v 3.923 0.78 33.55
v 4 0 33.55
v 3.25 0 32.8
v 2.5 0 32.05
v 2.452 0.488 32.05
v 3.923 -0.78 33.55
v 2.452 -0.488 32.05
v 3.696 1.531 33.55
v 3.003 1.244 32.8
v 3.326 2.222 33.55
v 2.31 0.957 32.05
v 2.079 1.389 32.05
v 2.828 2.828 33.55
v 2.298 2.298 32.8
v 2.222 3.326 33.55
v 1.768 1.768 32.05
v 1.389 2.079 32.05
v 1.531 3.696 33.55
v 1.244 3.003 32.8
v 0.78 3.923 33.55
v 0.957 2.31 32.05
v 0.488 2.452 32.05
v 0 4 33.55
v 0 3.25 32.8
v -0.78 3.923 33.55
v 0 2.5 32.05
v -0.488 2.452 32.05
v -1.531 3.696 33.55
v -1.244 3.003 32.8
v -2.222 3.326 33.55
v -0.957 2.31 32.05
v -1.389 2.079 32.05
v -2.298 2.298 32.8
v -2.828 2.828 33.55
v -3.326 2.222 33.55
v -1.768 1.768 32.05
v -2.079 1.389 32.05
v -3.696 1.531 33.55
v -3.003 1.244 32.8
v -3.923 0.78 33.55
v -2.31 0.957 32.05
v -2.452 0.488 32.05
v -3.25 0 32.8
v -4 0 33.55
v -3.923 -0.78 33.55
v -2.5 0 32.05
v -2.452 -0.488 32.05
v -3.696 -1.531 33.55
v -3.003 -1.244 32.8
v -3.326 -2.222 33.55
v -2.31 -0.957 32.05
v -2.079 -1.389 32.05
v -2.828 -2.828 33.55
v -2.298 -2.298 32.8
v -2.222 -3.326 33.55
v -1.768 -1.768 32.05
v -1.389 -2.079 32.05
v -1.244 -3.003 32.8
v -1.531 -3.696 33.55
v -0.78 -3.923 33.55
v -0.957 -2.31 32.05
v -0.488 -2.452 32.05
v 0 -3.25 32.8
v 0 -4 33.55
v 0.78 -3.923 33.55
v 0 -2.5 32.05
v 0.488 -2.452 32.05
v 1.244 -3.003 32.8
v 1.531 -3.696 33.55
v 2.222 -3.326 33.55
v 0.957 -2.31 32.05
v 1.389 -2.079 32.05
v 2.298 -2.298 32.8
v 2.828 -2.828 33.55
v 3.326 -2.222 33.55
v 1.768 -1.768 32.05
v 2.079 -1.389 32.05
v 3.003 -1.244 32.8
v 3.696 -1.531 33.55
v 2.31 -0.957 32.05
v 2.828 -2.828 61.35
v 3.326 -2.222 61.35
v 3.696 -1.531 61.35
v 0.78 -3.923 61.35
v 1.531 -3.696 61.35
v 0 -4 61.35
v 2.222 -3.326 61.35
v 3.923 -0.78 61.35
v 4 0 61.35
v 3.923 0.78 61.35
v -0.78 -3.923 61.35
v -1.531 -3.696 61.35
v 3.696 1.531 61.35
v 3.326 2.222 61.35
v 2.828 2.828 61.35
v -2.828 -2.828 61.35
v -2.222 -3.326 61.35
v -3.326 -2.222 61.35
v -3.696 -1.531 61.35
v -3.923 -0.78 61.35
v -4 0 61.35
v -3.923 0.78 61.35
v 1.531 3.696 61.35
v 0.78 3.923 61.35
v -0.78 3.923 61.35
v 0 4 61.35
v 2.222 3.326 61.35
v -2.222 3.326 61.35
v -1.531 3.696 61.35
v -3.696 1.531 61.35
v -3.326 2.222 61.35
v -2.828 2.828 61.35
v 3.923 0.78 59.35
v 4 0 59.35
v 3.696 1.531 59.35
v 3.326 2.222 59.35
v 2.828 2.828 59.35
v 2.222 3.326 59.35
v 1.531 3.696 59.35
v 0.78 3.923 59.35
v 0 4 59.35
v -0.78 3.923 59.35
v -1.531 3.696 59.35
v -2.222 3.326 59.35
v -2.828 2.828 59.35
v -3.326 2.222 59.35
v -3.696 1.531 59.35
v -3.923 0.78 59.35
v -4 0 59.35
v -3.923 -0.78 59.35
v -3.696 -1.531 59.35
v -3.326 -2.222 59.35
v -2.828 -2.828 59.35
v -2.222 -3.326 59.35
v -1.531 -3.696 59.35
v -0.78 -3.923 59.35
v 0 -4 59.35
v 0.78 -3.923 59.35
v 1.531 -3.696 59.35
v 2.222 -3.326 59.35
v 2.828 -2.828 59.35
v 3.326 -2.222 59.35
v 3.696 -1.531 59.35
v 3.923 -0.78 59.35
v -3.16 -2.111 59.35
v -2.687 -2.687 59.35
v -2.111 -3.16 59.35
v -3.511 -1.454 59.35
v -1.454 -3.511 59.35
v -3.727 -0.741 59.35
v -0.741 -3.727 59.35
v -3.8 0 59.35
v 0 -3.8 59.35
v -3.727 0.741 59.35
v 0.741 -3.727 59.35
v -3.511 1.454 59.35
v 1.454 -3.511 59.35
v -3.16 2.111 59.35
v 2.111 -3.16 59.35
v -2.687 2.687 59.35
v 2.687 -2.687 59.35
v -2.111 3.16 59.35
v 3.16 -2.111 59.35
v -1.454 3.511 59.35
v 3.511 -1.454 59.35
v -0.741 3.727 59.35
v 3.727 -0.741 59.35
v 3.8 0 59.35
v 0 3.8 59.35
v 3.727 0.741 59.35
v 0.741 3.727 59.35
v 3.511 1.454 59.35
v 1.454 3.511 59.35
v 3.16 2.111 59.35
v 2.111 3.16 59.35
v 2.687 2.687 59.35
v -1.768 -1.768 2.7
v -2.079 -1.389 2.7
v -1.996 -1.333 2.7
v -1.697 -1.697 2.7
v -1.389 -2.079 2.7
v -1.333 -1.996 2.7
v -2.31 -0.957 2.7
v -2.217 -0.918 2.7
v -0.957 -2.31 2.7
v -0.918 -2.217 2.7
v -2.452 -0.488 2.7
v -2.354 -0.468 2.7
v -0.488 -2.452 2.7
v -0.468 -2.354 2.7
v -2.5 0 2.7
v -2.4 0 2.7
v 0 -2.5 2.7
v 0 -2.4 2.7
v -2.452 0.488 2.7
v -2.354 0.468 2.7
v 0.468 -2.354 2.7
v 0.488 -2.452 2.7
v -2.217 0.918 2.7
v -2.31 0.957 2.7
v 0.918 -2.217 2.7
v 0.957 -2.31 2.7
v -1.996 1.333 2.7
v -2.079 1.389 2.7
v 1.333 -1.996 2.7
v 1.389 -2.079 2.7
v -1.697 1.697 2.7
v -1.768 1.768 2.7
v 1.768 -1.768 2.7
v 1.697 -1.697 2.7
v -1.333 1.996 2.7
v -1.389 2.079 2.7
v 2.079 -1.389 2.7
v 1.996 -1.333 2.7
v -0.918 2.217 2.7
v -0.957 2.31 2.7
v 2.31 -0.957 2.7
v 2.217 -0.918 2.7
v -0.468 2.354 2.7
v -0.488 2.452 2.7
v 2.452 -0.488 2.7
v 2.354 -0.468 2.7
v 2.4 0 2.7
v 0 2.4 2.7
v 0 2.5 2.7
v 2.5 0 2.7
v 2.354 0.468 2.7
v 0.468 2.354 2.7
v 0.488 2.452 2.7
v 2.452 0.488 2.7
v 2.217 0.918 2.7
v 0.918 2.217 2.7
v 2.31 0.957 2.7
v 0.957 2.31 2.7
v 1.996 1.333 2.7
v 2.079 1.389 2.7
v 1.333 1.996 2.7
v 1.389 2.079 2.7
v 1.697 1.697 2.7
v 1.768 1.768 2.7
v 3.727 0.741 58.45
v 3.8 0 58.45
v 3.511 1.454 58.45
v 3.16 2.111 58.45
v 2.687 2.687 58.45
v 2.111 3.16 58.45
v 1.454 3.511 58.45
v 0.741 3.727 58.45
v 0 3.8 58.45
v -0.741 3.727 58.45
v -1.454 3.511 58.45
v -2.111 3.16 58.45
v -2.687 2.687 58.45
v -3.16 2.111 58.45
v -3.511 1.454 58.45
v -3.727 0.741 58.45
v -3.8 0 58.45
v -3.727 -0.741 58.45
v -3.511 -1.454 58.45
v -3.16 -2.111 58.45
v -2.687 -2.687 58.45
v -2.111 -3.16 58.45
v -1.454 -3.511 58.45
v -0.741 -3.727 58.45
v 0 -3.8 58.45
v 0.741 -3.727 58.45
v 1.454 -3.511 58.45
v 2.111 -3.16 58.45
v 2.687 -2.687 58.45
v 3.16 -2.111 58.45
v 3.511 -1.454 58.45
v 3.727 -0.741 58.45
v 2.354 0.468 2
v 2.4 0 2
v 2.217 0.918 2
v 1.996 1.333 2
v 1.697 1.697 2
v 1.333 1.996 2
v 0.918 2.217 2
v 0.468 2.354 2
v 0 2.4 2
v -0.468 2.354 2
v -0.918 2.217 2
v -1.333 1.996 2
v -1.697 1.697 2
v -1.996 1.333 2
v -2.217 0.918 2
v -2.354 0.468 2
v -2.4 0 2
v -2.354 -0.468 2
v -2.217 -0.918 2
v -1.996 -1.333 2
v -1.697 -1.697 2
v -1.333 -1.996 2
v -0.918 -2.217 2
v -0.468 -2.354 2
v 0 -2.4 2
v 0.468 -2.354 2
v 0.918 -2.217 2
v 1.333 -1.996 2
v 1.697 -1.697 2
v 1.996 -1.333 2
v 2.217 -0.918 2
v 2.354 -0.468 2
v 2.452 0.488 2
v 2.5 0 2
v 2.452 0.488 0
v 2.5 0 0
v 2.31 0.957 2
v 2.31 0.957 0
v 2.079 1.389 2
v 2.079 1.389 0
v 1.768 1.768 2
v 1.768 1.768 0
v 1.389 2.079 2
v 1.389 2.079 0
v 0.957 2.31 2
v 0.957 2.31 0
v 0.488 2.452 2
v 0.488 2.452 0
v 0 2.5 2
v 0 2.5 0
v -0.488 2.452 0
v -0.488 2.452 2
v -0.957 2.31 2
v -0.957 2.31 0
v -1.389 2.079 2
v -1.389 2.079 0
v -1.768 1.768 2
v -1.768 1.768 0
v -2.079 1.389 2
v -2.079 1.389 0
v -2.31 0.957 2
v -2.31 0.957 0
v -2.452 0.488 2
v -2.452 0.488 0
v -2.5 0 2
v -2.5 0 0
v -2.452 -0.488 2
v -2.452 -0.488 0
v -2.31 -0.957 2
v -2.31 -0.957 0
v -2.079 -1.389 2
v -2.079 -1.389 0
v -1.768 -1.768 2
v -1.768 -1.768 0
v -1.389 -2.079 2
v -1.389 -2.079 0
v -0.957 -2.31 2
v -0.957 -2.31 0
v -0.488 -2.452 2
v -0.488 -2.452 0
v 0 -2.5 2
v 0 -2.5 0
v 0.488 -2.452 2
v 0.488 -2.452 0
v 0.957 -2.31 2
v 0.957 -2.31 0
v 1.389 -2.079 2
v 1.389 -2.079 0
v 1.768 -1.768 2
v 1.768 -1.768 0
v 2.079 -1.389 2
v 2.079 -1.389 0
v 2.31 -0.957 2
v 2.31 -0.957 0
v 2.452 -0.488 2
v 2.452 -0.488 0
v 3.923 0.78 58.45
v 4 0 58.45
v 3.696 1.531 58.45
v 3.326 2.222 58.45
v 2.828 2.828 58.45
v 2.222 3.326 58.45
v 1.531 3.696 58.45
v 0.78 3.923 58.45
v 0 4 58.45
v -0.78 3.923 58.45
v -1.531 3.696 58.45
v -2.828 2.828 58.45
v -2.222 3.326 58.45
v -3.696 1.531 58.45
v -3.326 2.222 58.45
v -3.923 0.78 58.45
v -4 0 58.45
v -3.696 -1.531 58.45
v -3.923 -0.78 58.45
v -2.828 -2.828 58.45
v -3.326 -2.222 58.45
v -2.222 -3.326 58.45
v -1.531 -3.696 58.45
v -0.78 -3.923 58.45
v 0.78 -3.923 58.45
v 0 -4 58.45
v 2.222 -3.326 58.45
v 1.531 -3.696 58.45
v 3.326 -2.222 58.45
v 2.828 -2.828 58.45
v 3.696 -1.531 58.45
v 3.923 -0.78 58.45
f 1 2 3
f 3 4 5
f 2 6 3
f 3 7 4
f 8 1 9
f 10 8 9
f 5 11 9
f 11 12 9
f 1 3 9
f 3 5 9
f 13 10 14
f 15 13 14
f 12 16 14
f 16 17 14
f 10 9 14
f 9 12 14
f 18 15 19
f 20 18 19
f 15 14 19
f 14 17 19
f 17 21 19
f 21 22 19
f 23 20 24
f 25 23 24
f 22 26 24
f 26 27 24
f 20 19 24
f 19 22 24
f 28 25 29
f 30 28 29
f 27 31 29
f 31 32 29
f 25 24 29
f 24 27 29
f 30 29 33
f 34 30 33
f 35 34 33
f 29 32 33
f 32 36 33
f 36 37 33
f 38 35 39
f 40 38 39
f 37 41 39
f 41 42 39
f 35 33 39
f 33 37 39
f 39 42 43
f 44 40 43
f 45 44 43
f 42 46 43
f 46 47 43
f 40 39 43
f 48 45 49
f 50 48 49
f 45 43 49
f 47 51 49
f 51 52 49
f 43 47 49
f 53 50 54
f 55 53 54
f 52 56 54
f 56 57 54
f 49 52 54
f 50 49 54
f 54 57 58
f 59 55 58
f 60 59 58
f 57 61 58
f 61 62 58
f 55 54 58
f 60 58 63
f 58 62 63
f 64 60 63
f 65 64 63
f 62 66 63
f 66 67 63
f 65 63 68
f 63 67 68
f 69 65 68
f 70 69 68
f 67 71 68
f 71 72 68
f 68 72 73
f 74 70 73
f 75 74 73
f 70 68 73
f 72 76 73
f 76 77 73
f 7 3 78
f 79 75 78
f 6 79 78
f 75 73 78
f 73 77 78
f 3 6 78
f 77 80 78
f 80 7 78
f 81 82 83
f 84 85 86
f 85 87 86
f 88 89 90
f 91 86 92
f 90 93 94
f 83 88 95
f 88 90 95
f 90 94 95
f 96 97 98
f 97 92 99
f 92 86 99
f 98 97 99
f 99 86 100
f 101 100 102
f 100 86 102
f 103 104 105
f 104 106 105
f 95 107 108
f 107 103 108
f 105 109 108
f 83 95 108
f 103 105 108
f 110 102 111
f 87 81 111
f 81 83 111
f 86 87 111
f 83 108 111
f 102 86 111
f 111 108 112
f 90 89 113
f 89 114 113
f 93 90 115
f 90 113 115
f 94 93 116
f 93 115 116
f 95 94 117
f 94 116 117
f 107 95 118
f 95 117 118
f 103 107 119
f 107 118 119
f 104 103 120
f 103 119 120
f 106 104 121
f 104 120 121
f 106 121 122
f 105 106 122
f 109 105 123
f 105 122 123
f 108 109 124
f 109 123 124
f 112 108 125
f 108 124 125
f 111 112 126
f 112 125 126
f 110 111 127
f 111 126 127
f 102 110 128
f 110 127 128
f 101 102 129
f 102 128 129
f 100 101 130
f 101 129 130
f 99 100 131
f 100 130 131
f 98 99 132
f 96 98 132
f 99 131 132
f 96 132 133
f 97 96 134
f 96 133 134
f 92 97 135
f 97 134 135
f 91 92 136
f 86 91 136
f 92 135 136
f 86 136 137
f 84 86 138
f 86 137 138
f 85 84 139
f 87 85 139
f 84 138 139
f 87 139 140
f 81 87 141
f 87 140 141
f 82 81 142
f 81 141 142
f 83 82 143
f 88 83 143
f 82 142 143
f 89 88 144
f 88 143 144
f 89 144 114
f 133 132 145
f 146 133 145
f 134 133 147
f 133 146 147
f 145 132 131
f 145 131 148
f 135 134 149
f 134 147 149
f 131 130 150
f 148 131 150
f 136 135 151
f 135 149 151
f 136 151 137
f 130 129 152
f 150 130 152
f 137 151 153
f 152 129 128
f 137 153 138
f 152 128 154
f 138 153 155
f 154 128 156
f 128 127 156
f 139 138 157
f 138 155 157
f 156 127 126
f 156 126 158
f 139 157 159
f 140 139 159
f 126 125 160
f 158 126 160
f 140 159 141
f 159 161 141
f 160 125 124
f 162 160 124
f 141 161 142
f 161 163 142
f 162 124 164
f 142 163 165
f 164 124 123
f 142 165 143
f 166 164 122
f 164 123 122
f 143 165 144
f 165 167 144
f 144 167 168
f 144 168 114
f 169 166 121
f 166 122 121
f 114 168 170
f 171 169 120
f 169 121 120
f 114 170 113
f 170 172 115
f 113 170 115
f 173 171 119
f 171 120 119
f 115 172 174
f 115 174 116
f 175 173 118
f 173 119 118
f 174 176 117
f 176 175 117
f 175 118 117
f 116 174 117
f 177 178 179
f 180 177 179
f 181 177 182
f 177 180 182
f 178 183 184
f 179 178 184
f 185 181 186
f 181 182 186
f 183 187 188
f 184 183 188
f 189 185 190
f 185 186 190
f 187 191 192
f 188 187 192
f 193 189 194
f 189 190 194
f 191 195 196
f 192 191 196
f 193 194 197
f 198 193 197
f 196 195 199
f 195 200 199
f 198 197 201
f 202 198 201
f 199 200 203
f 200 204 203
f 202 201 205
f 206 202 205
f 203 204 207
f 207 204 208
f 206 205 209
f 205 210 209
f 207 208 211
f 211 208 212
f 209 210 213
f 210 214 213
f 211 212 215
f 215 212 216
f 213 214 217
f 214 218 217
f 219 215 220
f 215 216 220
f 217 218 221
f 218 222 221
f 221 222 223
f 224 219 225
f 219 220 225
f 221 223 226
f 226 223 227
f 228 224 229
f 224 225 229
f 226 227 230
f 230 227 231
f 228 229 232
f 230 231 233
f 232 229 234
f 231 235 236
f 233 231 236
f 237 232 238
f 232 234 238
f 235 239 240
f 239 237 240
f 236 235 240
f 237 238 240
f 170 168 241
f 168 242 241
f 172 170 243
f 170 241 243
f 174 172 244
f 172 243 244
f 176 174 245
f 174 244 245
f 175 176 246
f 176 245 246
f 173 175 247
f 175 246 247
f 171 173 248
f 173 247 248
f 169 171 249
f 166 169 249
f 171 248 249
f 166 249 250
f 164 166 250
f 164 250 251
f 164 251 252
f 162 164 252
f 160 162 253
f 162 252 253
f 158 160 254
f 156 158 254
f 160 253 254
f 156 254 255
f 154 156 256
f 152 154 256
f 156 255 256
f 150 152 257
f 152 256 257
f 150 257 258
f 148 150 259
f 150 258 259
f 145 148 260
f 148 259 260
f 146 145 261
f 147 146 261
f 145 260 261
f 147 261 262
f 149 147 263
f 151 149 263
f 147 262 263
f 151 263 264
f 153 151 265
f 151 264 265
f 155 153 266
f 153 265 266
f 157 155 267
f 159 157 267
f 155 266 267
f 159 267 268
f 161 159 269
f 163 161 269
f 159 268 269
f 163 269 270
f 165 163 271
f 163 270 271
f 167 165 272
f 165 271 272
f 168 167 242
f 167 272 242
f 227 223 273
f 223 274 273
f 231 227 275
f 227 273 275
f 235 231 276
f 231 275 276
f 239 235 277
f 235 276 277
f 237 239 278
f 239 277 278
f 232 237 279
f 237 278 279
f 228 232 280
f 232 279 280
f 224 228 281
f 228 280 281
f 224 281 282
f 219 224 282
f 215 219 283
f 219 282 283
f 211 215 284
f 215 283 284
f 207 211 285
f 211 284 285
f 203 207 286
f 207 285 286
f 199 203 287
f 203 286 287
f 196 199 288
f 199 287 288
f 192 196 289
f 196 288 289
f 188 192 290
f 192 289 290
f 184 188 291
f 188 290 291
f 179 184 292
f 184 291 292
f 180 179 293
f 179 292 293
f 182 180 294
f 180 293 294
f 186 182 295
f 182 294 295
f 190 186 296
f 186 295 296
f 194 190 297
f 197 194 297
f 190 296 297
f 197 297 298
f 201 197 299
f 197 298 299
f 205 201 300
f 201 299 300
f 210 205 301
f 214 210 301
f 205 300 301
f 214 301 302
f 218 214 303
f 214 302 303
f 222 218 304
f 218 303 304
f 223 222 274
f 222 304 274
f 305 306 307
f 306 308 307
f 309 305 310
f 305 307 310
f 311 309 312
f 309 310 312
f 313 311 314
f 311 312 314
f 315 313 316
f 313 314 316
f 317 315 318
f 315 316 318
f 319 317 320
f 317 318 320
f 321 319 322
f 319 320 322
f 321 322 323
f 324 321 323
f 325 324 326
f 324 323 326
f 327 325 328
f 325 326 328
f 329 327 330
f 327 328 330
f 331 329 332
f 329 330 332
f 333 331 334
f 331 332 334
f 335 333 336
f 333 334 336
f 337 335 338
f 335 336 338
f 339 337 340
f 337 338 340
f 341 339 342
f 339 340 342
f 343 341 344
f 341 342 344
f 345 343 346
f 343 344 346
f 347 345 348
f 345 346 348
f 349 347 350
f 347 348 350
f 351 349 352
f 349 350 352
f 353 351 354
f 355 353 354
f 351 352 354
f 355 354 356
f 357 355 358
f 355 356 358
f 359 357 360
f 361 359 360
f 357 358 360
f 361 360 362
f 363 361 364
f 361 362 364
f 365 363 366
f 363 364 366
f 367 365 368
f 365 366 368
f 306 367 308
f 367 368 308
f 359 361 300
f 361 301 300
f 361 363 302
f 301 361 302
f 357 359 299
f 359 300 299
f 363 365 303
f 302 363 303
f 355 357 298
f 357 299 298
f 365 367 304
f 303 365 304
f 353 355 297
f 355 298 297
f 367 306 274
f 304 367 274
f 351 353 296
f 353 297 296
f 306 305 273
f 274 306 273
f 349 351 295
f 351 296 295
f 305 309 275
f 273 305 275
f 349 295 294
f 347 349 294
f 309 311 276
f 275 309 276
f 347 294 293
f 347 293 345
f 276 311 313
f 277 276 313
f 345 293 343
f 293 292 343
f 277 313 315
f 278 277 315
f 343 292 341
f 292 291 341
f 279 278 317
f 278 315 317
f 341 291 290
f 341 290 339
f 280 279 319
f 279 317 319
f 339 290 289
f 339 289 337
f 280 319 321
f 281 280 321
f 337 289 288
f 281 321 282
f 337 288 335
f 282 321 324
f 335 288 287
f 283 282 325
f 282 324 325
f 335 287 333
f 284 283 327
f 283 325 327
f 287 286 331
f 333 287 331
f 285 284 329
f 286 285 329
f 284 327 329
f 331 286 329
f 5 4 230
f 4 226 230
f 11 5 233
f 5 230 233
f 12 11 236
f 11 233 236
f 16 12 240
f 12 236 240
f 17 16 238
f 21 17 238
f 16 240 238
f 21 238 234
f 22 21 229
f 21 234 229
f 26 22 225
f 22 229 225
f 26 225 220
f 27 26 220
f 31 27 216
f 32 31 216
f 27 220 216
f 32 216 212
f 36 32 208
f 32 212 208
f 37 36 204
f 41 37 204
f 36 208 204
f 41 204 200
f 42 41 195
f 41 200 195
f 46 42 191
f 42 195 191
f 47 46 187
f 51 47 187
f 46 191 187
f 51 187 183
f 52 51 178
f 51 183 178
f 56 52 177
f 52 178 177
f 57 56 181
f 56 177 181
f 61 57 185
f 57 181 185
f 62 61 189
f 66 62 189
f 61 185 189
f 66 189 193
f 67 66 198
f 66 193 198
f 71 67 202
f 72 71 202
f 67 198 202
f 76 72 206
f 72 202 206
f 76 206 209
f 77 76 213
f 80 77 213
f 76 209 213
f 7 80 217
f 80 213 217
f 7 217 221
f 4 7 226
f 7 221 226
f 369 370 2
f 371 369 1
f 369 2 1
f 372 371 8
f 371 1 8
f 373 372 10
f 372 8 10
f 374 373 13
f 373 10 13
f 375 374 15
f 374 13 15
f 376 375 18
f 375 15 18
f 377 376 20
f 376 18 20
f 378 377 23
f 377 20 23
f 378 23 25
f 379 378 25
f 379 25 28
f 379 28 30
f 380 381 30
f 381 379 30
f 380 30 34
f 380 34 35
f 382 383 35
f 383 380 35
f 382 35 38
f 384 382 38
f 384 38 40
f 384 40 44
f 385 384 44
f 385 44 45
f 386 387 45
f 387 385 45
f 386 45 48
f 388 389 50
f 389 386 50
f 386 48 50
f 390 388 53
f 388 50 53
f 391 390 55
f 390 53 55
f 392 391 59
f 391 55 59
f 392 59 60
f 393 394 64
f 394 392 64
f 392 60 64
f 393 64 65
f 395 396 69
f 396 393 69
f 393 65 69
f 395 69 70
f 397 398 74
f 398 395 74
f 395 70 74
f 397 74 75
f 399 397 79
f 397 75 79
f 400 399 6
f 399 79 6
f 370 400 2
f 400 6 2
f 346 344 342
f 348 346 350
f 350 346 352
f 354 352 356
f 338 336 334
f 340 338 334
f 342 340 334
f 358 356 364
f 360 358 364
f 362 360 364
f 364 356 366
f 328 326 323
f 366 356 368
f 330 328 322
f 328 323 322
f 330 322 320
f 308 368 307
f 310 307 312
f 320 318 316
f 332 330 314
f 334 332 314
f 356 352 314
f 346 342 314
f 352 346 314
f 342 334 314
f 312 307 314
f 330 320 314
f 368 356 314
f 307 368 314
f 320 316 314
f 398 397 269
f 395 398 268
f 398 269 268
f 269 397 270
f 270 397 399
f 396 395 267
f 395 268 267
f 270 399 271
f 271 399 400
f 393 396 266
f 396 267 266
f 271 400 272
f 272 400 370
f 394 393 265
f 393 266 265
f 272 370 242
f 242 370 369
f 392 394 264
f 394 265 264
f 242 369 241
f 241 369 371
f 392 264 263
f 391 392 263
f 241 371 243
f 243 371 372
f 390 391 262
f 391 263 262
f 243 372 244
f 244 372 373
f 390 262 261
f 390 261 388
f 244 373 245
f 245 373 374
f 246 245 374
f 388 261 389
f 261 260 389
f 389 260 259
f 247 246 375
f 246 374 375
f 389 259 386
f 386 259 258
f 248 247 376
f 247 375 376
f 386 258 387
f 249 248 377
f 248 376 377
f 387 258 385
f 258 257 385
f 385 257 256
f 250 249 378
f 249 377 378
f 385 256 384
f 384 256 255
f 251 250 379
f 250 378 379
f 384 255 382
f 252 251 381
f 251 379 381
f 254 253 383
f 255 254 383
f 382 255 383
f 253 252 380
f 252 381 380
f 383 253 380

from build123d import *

# Parameters (mm, degrees)
F0_R     = 4
F1_DEPTH = 200


with BuildPart() as f1:
    # F0 (on Top) → F1 (new body)
    with BuildSketch(Plane.XY):
        Circle(F0_R)
    extrude(amount=F1_DEPTH)

    # F2 (on Front) → F3 (revolve, cut)
    with BuildSketch(Plane.XZ):
        Polygon((2.5, 2), (2.5, 0), (4, 0), (4, 33.55), (2.5, 32.05), (2.5, 2.7), (2.4, 2.7), (2.4, 2), align=None)
    revolve(axis=Axis((0, 0, 16.025), (0, 0, 1)), mode=Mode.SUBTRACT)

    # F4 (on Front) → F5 (revolve, cut)
    with BuildSketch(Plane.XZ):
        Polygon((0, 200), (0, 61.35), (4, 61.35), (4, 59.35), (3.8, 59.35), (3.8, 58.45), (4, 58.45), (6.54, 58.45), (6.54, 63.53), (4, 63.53), (4, 200), align=None)
    revolve(axis=Axis((0, 0, 130.675), (0, 0, 1)), mode=Mode.SUBTRACT)


solid = f1.part
